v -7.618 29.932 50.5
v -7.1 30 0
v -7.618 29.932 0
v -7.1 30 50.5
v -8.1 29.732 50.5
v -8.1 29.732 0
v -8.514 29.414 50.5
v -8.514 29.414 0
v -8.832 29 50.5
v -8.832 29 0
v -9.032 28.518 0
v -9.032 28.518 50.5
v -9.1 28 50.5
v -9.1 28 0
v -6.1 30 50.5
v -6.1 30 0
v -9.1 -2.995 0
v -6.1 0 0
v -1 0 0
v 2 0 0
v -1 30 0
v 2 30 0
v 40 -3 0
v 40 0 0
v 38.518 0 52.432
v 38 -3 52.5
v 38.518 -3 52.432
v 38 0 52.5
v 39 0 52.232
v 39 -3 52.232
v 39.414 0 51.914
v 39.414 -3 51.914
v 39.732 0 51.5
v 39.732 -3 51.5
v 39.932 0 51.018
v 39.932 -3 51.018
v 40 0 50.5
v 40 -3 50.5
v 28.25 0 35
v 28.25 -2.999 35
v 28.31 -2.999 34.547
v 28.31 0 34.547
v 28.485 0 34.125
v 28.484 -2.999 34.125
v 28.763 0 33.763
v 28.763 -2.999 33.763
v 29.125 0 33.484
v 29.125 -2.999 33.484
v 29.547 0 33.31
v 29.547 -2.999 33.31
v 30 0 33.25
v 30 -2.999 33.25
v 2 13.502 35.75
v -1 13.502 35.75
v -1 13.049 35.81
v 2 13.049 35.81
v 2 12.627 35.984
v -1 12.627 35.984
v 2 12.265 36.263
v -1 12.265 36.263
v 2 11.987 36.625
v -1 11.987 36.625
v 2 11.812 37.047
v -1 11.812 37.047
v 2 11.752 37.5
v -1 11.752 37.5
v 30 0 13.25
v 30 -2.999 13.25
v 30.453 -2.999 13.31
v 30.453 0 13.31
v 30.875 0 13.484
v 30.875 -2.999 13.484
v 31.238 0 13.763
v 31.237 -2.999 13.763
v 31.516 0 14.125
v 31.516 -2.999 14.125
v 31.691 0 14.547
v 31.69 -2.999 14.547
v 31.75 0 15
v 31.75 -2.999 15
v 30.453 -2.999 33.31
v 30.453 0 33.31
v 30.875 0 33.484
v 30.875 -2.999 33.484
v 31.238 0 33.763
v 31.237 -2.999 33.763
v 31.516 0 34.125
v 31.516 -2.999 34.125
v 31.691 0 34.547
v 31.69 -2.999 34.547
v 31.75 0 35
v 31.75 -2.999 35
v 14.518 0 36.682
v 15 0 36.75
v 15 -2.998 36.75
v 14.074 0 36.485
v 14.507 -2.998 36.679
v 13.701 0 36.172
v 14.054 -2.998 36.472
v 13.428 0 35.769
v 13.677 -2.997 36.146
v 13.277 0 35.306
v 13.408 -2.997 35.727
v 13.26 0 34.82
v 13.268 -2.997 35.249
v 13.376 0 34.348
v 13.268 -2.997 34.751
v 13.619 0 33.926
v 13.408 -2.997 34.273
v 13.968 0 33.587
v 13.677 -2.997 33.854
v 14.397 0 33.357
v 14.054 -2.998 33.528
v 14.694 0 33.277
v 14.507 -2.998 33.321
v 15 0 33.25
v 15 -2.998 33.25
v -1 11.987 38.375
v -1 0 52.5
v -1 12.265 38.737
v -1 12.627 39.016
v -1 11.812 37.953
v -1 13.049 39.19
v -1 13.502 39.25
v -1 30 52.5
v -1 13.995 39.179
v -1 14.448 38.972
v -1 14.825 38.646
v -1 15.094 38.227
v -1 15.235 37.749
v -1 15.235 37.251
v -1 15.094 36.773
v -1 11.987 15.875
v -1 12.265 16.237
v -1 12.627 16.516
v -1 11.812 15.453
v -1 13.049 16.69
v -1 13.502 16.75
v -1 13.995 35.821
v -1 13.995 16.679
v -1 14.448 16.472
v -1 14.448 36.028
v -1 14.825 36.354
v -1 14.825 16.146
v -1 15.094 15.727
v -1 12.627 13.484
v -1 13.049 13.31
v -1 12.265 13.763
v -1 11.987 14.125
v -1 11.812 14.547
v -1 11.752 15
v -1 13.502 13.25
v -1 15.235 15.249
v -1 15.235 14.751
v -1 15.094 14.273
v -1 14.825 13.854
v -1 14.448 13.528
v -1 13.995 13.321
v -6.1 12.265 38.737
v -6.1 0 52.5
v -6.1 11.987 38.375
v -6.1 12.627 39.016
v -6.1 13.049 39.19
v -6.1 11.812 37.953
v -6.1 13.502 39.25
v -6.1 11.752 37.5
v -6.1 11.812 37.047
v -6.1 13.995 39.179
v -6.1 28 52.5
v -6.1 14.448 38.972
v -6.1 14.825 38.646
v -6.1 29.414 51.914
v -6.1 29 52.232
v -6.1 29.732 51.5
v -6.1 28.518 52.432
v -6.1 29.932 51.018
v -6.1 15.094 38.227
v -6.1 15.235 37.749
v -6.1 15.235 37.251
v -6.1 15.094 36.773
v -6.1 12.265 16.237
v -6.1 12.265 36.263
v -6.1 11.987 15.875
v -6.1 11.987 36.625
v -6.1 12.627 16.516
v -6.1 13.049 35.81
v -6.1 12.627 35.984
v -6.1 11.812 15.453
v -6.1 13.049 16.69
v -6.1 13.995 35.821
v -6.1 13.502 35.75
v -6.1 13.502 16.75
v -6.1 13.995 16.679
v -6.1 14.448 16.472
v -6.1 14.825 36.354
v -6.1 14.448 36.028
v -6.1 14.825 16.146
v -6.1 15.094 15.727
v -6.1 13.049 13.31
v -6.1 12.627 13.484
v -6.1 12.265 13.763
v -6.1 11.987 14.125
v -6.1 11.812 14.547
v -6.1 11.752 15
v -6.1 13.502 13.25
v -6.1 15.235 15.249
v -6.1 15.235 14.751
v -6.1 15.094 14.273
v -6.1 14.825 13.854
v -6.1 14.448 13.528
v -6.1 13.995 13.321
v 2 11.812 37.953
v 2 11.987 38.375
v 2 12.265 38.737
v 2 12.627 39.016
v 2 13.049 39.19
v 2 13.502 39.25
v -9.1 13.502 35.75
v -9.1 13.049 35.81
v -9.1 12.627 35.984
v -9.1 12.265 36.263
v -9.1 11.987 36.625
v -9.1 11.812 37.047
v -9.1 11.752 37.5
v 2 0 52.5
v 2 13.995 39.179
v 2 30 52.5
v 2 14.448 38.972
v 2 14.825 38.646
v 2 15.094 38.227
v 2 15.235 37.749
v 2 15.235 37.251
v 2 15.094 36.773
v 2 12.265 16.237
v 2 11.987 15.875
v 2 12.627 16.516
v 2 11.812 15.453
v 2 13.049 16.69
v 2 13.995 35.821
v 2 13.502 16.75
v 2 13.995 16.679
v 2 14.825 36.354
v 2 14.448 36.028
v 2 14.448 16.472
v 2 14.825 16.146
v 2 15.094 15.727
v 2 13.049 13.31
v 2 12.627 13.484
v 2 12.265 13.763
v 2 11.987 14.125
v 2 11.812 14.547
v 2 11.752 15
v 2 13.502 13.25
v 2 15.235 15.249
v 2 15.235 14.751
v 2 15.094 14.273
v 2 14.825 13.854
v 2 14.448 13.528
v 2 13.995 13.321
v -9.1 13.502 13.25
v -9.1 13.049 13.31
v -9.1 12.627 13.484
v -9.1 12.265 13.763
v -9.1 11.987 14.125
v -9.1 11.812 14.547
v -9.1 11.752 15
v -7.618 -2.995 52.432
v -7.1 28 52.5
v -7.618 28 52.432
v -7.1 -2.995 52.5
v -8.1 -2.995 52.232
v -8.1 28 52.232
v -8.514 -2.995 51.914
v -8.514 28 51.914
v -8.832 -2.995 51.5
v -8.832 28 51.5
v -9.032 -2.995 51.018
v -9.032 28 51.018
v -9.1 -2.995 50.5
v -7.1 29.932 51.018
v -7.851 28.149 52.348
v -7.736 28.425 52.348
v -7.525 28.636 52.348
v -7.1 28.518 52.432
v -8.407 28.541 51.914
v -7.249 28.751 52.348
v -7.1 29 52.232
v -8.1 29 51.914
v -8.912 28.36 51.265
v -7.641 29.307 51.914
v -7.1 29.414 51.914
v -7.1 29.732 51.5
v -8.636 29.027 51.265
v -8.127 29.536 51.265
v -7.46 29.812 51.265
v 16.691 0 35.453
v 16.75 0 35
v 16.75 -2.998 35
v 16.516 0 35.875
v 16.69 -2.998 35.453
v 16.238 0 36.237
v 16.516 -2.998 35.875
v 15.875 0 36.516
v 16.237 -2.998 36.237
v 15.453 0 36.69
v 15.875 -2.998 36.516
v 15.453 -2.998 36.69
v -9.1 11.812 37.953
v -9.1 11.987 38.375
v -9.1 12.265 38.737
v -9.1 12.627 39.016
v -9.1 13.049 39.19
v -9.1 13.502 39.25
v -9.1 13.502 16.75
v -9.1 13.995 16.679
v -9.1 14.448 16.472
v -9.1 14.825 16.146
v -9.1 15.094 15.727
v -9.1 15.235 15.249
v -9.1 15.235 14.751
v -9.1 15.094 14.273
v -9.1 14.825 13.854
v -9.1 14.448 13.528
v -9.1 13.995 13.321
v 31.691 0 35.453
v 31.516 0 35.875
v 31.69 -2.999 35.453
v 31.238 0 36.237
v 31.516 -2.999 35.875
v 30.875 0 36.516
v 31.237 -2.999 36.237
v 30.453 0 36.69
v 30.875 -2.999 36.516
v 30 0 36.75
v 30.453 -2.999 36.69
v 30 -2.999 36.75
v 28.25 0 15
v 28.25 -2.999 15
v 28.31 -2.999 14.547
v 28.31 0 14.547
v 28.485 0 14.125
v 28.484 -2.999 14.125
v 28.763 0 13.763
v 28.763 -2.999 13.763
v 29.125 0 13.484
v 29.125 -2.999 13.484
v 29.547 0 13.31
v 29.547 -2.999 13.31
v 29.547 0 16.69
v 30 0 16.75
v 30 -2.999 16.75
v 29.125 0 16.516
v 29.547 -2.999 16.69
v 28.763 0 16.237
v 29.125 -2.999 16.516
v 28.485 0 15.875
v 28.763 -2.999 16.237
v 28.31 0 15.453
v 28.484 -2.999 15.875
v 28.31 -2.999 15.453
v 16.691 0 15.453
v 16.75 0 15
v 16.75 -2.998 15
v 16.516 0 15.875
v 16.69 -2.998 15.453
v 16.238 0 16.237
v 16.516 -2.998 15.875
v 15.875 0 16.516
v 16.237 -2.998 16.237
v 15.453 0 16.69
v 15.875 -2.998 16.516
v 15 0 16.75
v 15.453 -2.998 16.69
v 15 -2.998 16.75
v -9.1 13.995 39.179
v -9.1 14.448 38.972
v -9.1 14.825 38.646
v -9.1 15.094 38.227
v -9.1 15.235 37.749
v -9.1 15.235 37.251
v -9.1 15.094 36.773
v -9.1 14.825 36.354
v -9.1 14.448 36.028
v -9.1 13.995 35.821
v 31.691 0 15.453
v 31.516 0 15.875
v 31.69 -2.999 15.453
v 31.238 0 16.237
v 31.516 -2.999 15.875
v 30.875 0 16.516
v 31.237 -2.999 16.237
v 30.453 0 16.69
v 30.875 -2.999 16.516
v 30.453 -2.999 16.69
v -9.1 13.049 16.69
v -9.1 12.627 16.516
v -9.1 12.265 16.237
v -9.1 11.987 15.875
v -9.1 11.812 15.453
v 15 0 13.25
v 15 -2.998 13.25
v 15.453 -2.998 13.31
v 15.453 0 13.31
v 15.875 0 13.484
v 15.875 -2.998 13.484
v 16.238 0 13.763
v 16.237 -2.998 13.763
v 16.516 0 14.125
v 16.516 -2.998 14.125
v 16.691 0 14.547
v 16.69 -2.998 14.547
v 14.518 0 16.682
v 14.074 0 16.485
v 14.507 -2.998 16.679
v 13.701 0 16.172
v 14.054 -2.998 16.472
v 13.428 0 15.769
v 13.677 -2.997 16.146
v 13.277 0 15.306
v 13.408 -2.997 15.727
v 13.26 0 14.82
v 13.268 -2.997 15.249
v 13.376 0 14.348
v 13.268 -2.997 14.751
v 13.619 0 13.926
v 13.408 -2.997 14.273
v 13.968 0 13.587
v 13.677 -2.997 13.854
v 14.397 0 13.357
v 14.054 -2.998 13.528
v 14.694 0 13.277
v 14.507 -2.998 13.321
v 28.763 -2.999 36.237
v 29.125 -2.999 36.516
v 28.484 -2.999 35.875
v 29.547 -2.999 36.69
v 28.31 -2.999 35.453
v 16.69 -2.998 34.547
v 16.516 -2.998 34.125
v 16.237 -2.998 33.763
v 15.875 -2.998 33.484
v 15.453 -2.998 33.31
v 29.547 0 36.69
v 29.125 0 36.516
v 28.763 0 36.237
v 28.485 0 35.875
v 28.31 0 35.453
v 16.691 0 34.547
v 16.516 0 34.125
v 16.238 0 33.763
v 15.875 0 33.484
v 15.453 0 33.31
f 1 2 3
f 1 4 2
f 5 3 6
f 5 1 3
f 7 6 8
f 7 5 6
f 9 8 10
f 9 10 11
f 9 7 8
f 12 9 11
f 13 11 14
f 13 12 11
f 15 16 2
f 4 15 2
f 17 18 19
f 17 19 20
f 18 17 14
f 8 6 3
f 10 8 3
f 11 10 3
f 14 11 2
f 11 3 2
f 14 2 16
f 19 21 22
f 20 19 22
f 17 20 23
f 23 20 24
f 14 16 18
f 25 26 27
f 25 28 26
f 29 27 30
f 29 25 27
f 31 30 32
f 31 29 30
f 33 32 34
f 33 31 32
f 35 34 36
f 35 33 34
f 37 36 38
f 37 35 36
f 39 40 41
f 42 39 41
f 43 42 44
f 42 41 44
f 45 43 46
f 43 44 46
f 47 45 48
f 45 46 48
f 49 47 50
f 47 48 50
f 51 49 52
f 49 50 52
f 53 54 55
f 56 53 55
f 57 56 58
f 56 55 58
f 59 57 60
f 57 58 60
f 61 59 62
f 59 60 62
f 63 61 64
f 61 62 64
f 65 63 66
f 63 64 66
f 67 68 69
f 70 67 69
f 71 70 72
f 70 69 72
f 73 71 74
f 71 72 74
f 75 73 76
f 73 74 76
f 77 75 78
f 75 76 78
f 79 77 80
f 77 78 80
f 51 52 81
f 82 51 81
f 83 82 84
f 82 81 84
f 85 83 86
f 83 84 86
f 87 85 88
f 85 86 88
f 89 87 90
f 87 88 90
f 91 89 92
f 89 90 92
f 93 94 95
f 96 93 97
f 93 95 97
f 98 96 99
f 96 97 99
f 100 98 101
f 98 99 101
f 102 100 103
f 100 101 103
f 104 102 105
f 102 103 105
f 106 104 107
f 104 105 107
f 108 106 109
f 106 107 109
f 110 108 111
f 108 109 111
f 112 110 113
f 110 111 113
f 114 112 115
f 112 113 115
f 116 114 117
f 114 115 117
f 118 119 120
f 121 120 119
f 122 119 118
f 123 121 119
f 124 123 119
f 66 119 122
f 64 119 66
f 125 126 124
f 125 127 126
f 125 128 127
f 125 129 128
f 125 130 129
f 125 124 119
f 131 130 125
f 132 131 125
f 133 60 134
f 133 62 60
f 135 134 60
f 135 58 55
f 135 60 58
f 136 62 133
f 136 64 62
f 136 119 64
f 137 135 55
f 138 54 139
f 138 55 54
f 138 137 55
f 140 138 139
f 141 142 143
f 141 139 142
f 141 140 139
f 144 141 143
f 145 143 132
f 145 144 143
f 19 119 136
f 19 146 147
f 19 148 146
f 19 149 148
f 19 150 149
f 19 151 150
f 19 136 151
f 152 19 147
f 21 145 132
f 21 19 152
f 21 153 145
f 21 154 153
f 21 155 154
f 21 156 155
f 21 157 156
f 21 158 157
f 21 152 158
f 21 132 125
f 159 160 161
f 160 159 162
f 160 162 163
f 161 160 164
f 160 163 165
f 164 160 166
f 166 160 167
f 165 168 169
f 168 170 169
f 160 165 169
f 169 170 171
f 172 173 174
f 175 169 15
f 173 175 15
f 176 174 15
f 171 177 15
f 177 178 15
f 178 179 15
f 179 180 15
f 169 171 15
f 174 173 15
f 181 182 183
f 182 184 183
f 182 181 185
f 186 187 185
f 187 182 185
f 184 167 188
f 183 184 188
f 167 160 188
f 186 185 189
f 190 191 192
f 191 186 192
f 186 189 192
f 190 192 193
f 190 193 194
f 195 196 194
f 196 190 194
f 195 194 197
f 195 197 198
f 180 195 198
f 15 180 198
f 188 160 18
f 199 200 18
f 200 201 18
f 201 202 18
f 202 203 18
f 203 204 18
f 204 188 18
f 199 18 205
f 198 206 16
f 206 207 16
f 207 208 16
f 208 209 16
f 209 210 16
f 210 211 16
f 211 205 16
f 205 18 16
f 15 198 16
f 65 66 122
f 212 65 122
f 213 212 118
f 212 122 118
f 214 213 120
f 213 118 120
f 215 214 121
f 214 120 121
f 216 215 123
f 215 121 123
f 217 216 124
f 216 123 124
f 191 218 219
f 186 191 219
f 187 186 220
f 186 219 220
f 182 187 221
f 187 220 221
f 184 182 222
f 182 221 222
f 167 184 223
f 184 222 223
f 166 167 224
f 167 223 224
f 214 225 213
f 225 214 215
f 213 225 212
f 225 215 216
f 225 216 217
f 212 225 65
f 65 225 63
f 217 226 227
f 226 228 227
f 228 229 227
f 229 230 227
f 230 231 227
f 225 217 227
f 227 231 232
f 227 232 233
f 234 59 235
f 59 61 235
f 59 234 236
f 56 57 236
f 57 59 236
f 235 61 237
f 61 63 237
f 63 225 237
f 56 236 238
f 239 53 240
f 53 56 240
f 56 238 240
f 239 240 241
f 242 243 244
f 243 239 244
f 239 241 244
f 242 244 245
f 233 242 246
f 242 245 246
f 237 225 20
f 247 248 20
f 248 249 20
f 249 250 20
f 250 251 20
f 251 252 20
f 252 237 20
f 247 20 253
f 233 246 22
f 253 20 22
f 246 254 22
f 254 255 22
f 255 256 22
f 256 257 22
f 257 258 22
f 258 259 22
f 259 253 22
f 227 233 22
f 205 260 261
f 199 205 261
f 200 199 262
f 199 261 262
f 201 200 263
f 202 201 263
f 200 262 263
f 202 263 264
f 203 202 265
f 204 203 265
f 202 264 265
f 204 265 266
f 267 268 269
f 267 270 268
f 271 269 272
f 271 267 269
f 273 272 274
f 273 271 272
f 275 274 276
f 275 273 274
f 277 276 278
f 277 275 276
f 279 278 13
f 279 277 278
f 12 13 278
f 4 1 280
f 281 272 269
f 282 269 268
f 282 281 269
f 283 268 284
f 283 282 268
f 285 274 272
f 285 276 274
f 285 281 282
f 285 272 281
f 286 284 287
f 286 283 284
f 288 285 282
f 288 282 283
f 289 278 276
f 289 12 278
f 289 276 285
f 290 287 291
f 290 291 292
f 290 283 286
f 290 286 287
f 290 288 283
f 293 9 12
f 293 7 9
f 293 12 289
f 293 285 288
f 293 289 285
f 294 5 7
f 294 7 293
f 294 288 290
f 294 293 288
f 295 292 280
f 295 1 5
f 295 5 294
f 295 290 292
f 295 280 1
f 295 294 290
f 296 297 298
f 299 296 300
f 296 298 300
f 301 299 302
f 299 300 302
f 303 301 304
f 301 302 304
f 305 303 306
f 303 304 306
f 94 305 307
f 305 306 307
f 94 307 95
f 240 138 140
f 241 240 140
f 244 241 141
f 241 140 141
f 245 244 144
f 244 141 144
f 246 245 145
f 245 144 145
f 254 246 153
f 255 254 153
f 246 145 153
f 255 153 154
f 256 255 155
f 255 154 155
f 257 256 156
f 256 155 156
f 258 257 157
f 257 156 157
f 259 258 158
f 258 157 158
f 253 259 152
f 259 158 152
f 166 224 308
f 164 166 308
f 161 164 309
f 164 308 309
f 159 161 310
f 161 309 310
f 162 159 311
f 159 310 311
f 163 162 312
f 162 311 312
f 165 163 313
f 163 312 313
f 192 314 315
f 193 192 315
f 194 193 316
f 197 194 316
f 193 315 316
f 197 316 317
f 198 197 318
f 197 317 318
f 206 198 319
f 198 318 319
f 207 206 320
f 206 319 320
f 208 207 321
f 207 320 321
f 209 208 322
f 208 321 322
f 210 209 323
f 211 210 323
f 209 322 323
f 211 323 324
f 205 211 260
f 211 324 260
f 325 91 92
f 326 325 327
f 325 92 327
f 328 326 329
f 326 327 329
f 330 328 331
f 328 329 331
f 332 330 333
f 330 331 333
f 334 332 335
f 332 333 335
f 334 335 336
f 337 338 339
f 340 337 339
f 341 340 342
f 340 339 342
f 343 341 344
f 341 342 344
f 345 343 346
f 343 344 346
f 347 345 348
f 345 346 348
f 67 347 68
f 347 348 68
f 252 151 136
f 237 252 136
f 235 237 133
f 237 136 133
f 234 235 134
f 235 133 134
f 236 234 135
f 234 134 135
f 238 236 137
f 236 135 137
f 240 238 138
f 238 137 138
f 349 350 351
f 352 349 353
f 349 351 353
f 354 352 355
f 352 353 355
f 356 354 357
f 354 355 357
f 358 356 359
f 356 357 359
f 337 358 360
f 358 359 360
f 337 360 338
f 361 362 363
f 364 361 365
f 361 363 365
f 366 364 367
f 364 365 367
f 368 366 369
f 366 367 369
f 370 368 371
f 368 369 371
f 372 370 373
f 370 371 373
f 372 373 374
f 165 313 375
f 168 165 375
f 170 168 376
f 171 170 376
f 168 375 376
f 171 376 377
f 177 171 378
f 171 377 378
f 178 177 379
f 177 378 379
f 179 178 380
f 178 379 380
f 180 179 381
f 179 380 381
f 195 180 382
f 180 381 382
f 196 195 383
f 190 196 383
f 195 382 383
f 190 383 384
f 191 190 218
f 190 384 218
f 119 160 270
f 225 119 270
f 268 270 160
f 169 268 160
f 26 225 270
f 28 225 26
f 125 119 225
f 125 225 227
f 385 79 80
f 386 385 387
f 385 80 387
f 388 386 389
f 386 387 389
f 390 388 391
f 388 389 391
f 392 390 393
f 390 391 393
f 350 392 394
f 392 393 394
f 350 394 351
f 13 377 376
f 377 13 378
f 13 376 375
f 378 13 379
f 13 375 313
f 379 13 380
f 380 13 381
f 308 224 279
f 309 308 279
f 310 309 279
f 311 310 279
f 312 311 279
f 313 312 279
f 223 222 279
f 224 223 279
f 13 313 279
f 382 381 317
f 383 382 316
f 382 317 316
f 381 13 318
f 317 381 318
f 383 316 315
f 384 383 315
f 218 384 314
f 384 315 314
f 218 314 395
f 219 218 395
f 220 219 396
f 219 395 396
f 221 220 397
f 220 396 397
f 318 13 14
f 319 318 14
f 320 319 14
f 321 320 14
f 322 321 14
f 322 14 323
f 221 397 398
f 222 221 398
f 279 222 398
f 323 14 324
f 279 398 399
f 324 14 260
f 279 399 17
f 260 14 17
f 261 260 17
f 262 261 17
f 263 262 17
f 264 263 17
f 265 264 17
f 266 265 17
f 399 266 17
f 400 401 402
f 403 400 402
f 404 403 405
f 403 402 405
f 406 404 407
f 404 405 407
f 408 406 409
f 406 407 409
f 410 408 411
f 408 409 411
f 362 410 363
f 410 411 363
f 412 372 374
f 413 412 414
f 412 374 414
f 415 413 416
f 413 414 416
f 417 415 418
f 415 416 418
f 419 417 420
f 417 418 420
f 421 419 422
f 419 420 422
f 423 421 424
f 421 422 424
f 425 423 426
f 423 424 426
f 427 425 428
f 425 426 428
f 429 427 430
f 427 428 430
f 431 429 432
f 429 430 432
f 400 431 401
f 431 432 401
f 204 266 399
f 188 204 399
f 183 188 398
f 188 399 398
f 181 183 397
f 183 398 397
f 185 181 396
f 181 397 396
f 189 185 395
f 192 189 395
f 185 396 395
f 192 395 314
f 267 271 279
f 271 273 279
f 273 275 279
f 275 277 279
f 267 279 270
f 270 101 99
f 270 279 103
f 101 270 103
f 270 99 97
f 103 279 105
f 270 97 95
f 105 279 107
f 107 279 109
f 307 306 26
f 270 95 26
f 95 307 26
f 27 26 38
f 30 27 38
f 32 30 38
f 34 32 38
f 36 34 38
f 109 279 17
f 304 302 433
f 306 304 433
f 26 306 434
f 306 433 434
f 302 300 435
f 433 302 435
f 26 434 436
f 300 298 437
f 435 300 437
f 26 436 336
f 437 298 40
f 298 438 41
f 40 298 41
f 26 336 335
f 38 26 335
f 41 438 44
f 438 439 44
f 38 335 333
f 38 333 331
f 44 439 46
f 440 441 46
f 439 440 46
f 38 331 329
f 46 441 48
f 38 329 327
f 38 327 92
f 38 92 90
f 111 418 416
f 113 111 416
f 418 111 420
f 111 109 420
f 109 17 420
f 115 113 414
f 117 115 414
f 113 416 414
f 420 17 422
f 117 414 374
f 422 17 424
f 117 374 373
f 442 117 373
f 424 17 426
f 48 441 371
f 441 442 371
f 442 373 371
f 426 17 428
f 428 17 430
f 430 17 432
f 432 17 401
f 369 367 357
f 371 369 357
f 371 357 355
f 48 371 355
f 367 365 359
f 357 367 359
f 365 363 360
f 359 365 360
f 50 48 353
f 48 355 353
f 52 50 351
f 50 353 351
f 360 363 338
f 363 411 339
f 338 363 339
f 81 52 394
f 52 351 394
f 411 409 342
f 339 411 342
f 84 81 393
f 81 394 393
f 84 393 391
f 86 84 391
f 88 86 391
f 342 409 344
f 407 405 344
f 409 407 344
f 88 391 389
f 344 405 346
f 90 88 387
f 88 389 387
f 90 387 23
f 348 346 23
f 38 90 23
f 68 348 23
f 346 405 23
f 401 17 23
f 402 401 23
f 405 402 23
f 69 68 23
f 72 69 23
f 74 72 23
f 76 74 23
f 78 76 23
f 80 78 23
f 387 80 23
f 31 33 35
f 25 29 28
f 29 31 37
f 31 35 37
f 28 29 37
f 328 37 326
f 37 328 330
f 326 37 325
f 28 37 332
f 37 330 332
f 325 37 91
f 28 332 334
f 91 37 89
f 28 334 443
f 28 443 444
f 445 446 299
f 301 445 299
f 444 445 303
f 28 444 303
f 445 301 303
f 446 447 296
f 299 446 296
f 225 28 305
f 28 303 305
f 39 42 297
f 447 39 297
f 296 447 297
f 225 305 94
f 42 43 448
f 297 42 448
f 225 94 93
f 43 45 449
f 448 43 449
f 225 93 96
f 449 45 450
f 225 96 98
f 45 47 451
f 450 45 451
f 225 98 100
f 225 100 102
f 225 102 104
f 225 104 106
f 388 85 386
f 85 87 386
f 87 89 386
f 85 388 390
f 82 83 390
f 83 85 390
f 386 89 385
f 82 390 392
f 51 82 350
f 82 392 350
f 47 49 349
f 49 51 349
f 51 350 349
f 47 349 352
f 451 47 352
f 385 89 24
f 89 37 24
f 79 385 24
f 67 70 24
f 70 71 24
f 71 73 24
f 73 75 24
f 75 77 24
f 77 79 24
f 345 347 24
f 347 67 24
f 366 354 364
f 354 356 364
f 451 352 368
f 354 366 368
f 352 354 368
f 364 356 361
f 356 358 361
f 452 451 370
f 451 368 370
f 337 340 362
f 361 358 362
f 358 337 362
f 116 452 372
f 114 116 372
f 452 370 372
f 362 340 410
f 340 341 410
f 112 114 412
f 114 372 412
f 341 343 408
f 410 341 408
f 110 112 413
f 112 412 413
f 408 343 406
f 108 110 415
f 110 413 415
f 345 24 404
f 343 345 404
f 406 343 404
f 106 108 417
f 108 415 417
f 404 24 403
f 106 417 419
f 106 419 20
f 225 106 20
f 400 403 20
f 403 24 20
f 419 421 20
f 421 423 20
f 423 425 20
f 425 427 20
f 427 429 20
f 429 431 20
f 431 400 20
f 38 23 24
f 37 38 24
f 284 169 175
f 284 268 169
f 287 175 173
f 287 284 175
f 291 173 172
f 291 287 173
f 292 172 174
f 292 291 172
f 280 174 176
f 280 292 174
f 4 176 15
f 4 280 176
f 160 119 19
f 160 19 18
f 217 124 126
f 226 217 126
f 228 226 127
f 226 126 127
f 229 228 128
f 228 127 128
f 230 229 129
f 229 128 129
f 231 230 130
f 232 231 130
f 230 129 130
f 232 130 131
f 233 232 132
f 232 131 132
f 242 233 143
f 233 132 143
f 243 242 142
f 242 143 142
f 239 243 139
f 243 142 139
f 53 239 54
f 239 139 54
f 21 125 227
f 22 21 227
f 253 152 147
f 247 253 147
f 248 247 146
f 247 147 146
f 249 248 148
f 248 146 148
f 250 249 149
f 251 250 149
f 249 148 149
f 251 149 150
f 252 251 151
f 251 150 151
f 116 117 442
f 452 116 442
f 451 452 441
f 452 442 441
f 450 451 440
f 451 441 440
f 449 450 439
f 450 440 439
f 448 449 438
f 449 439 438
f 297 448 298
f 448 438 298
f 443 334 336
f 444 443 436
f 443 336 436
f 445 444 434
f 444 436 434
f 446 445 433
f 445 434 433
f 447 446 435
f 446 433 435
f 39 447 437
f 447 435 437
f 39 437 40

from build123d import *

# Parameters (mm, degrees)
F0_W     = 3
F0_H     = 30
F1_DEPTH = 52.5
F3_DEPTH = 25
F4_R     = 2
F6_DEPTH = 25


# Not quite as in the source:
# - a feature names something its author has since deleted; it is built from what else it names


with BuildPart() as f1:
    # F0 (on Top) → F1 (new body)
    with BuildSketch(Plane.XY):
        Polygon((2, 0), (-1, 0), (-6.1, 0), (-6.1, 30), (-9.1, 30), (-9.1, -2.9952730983), (40, -3), (40, 0), align=None)
        with Locations((0.5, 15)):
            Rectangle(F0_W, F0_H)
    extrude(amount=F1_DEPTH)

    # F2 (on face) → F3 (cut)
    with BuildSketch(Plane(origin=(-9.1, 0, 0), x_dir=(0, -1, 0), z_dir=(-1, 0, 0))):
        with BuildLine():
            Line((-13.5023634508, 37.5), (-13.5023634508, 39.25))
            ThreePointArc((-13.5023634508, 39.25), (-15.2523634508, 37.5), (-13.5023634508, 35.75))
            Line((-13.5023634508, 35.75), (-13.5023634508, 37.5))
        make_face()
        with BuildLine():
            ThreePointArc((-11.7523634508, 37.5), (-12.2649265837, 38.7374368671), (-13.5023634508, 39.25))
            Line((-13.5023634508, 39.25), (-13.5023634508, 37.5))
            Line((-13.5023634508, 37.5), (-13.5023634508, 35.75))
            ThreePointArc((-13.5023634508, 35.75), (-12.2649265837, 36.2625631329), (-11.7523634508, 37.5))
        make_face()
        with BuildLine():
            Line((-13.5023634508, 15), (-13.5023634508, 13.25))
            ThreePointArc((-13.5023634508, 13.25), (-12.2649265837, 13.7625631329), (-11.7523634508, 15))
            ThreePointArc((-11.7523634508, 15), (-12.2649265837, 16.2374368671), (-13.5023634508, 16.75))
            Line((-13.5023634508, 16.75), (-13.5023634508, 15))
        make_face()
        with BuildLine():
            ThreePointArc((-13.5023634508, 16.75), (-15.2523634508, 15), (-13.5023634508, 13.25))
            Line((-13.5023634508, 13.25), (-13.5023634508, 15))
            Line((-13.5023634508, 15), (-13.5023634508, 16.75))
        make_face()
    extrude(amount=-F3_DEPTH, mode=Mode.SUBTRACT)

    # F4
    f4_edges = [f1.edges().sort_by_distance(p)[0] for p in [
        (40, -1.5, 52.5),
        (-9.1, 30, 26.25),
        (-9.1, 13.502363, 52.5),
        (-7.6, 30, 52.5),
    ]]
    fillet(f4_edges, radius=F4_R)

    # F5 (on face) → F6 (cut)
    with BuildSketch(Plane(origin=(-0.000288442, -2.9961491359, 0), x_dir=(0.9999999954, -9.62709e-05, 0), z_dir=(-9.62709e-05, -0.9999999954, 0))):
        with BuildLine():
            Line((15.0002886274, 35), (15.0002886274, 33.25))
            ThreePointArc((15.0002886274, 33.25), (16.2377254944, 33.7625631329), (16.7502886274, 35))
            Line((16.7502886274, 35), (15.0002886274, 35))
        make_face()
        with BuildLine():
            ThreePointArc((15.0002886274, 36.75), (13.2502886274, 35), (15.0002886274, 33.25))
            Line((15.0002886274, 33.25), (15.0002886274, 35))
            Line((15.0002886274, 35), (15.0002886274, 36.75))
        make_face()
        with BuildLine():
            Line((15.0002886274, 36.75), (15.0002886274, 35))
            Line((15.0002886274, 35), (16.7502886274, 35))
            ThreePointArc((16.7502886274, 35), (16.2377254944, 36.2374368671), (15.0002886274, 36.75))
        make_face()
        with BuildLine():
            Line((30.0002886274, 35), (31.7502886274, 35))
            ThreePointArc((31.7502886274, 35), (31.2377254944, 36.2374368671), (30.0002886274, 36.75))
            Line((30.0002886274, 36.75), (30.0002886274, 35))
        make_face()
        with BuildLine():
            Line((28.2502886274, 35), (30.0002886274, 35))
            Line((30.0002886274, 35), (30.0002886274, 36.75))
            ThreePointArc((30.0002886274, 36.75), (28.7628517603, 36.2374368671), (28.2502886274, 35))
        make_face()
        with BuildLine():
            Line((30.0002886274, 33.25), (30.0002886274, 35))
            Line((30.0002886274, 35), (28.2502886274, 35))
            ThreePointArc((28.2502886274, 35), (28.7628517603, 33.7625631329), (30.0002886274, 33.25))
        make_face()
        with BuildLine():
            ThreePointArc((30.0002886274, 33.25), (31.2377254944, 33.7625631329), (31.7502886274, 35))
            Line((31.7502886274, 35), (30.0002886274, 35))
            Line((30.0002886274, 35), (30.0002886274, 33.25))
        make_face()
        with BuildLine():
            Line((30.0002886274, 15), (31.7502886274, 15))
            ThreePointArc((31.7502886274, 15), (31.2377254944, 16.2374368671), (30.0002886274, 16.75))
            Line((30.0002886274, 16.75), (30.0002886274, 15))
        make_face()
        with BuildLine():
            Line((28.2502886274, 15), (30.0002886274, 15))
            Line((30.0002886274, 15), (30.0002886274, 16.75))
            ThreePointArc((30.0002886274, 16.75), (28.7628517603, 16.2374368671), (28.2502886274, 15))
        make_face()
        with BuildLine():
            ThreePointArc((28.2502886274, 15), (28.7628517603, 13.7625631329), (30.0002886274, 13.25))
            Line((30.0002886274, 13.25), (30.0002886274, 15))
            Line((30.0002886274, 15), (28.2502886274, 15))
        make_face()
        with BuildLine():
            Line((30.0002886274, 15), (30.0002886274, 13.25))
            ThreePointArc((30.0002886274, 13.25), (31.2377254944, 13.7625631329), (31.7502886274, 15))
            Line((31.7502886274, 15), (30.0002886274, 15))
        make_face()
        with BuildLine():
            Line((15.0002886274, 15), (15.0002886274, 13.25))
            ThreePointArc((15.0002886274, 13.25), (16.2377254944, 13.7625631329), (16.7502886274, 15))
            Line((16.7502886274, 15), (15.0002886274, 15))
        make_face()
        with BuildLine():
            Line((15.0002886274, 16.75), (15.0002886274, 15))
            Line((15.0002886274, 15), (16.7502886274, 15))
            ThreePointArc((16.7502886274, 15), (16.2377254944, 16.2374368671), (15.0002886274, 16.75))
        make_face()
        with BuildLine():
            ThreePointArc((15.0002886274, 16.75), (13.2502886274, 15), (15.0002886274, 13.25))
            Line((15.0002886274, 13.25), (15.0002886274, 15))
            Line((15.0002886274, 15), (15.0002886274, 16.75))
        make_face()
    extrude(amount=-F6_DEPTH, mode=Mode.SUBTRACT)


solid = f1.part
